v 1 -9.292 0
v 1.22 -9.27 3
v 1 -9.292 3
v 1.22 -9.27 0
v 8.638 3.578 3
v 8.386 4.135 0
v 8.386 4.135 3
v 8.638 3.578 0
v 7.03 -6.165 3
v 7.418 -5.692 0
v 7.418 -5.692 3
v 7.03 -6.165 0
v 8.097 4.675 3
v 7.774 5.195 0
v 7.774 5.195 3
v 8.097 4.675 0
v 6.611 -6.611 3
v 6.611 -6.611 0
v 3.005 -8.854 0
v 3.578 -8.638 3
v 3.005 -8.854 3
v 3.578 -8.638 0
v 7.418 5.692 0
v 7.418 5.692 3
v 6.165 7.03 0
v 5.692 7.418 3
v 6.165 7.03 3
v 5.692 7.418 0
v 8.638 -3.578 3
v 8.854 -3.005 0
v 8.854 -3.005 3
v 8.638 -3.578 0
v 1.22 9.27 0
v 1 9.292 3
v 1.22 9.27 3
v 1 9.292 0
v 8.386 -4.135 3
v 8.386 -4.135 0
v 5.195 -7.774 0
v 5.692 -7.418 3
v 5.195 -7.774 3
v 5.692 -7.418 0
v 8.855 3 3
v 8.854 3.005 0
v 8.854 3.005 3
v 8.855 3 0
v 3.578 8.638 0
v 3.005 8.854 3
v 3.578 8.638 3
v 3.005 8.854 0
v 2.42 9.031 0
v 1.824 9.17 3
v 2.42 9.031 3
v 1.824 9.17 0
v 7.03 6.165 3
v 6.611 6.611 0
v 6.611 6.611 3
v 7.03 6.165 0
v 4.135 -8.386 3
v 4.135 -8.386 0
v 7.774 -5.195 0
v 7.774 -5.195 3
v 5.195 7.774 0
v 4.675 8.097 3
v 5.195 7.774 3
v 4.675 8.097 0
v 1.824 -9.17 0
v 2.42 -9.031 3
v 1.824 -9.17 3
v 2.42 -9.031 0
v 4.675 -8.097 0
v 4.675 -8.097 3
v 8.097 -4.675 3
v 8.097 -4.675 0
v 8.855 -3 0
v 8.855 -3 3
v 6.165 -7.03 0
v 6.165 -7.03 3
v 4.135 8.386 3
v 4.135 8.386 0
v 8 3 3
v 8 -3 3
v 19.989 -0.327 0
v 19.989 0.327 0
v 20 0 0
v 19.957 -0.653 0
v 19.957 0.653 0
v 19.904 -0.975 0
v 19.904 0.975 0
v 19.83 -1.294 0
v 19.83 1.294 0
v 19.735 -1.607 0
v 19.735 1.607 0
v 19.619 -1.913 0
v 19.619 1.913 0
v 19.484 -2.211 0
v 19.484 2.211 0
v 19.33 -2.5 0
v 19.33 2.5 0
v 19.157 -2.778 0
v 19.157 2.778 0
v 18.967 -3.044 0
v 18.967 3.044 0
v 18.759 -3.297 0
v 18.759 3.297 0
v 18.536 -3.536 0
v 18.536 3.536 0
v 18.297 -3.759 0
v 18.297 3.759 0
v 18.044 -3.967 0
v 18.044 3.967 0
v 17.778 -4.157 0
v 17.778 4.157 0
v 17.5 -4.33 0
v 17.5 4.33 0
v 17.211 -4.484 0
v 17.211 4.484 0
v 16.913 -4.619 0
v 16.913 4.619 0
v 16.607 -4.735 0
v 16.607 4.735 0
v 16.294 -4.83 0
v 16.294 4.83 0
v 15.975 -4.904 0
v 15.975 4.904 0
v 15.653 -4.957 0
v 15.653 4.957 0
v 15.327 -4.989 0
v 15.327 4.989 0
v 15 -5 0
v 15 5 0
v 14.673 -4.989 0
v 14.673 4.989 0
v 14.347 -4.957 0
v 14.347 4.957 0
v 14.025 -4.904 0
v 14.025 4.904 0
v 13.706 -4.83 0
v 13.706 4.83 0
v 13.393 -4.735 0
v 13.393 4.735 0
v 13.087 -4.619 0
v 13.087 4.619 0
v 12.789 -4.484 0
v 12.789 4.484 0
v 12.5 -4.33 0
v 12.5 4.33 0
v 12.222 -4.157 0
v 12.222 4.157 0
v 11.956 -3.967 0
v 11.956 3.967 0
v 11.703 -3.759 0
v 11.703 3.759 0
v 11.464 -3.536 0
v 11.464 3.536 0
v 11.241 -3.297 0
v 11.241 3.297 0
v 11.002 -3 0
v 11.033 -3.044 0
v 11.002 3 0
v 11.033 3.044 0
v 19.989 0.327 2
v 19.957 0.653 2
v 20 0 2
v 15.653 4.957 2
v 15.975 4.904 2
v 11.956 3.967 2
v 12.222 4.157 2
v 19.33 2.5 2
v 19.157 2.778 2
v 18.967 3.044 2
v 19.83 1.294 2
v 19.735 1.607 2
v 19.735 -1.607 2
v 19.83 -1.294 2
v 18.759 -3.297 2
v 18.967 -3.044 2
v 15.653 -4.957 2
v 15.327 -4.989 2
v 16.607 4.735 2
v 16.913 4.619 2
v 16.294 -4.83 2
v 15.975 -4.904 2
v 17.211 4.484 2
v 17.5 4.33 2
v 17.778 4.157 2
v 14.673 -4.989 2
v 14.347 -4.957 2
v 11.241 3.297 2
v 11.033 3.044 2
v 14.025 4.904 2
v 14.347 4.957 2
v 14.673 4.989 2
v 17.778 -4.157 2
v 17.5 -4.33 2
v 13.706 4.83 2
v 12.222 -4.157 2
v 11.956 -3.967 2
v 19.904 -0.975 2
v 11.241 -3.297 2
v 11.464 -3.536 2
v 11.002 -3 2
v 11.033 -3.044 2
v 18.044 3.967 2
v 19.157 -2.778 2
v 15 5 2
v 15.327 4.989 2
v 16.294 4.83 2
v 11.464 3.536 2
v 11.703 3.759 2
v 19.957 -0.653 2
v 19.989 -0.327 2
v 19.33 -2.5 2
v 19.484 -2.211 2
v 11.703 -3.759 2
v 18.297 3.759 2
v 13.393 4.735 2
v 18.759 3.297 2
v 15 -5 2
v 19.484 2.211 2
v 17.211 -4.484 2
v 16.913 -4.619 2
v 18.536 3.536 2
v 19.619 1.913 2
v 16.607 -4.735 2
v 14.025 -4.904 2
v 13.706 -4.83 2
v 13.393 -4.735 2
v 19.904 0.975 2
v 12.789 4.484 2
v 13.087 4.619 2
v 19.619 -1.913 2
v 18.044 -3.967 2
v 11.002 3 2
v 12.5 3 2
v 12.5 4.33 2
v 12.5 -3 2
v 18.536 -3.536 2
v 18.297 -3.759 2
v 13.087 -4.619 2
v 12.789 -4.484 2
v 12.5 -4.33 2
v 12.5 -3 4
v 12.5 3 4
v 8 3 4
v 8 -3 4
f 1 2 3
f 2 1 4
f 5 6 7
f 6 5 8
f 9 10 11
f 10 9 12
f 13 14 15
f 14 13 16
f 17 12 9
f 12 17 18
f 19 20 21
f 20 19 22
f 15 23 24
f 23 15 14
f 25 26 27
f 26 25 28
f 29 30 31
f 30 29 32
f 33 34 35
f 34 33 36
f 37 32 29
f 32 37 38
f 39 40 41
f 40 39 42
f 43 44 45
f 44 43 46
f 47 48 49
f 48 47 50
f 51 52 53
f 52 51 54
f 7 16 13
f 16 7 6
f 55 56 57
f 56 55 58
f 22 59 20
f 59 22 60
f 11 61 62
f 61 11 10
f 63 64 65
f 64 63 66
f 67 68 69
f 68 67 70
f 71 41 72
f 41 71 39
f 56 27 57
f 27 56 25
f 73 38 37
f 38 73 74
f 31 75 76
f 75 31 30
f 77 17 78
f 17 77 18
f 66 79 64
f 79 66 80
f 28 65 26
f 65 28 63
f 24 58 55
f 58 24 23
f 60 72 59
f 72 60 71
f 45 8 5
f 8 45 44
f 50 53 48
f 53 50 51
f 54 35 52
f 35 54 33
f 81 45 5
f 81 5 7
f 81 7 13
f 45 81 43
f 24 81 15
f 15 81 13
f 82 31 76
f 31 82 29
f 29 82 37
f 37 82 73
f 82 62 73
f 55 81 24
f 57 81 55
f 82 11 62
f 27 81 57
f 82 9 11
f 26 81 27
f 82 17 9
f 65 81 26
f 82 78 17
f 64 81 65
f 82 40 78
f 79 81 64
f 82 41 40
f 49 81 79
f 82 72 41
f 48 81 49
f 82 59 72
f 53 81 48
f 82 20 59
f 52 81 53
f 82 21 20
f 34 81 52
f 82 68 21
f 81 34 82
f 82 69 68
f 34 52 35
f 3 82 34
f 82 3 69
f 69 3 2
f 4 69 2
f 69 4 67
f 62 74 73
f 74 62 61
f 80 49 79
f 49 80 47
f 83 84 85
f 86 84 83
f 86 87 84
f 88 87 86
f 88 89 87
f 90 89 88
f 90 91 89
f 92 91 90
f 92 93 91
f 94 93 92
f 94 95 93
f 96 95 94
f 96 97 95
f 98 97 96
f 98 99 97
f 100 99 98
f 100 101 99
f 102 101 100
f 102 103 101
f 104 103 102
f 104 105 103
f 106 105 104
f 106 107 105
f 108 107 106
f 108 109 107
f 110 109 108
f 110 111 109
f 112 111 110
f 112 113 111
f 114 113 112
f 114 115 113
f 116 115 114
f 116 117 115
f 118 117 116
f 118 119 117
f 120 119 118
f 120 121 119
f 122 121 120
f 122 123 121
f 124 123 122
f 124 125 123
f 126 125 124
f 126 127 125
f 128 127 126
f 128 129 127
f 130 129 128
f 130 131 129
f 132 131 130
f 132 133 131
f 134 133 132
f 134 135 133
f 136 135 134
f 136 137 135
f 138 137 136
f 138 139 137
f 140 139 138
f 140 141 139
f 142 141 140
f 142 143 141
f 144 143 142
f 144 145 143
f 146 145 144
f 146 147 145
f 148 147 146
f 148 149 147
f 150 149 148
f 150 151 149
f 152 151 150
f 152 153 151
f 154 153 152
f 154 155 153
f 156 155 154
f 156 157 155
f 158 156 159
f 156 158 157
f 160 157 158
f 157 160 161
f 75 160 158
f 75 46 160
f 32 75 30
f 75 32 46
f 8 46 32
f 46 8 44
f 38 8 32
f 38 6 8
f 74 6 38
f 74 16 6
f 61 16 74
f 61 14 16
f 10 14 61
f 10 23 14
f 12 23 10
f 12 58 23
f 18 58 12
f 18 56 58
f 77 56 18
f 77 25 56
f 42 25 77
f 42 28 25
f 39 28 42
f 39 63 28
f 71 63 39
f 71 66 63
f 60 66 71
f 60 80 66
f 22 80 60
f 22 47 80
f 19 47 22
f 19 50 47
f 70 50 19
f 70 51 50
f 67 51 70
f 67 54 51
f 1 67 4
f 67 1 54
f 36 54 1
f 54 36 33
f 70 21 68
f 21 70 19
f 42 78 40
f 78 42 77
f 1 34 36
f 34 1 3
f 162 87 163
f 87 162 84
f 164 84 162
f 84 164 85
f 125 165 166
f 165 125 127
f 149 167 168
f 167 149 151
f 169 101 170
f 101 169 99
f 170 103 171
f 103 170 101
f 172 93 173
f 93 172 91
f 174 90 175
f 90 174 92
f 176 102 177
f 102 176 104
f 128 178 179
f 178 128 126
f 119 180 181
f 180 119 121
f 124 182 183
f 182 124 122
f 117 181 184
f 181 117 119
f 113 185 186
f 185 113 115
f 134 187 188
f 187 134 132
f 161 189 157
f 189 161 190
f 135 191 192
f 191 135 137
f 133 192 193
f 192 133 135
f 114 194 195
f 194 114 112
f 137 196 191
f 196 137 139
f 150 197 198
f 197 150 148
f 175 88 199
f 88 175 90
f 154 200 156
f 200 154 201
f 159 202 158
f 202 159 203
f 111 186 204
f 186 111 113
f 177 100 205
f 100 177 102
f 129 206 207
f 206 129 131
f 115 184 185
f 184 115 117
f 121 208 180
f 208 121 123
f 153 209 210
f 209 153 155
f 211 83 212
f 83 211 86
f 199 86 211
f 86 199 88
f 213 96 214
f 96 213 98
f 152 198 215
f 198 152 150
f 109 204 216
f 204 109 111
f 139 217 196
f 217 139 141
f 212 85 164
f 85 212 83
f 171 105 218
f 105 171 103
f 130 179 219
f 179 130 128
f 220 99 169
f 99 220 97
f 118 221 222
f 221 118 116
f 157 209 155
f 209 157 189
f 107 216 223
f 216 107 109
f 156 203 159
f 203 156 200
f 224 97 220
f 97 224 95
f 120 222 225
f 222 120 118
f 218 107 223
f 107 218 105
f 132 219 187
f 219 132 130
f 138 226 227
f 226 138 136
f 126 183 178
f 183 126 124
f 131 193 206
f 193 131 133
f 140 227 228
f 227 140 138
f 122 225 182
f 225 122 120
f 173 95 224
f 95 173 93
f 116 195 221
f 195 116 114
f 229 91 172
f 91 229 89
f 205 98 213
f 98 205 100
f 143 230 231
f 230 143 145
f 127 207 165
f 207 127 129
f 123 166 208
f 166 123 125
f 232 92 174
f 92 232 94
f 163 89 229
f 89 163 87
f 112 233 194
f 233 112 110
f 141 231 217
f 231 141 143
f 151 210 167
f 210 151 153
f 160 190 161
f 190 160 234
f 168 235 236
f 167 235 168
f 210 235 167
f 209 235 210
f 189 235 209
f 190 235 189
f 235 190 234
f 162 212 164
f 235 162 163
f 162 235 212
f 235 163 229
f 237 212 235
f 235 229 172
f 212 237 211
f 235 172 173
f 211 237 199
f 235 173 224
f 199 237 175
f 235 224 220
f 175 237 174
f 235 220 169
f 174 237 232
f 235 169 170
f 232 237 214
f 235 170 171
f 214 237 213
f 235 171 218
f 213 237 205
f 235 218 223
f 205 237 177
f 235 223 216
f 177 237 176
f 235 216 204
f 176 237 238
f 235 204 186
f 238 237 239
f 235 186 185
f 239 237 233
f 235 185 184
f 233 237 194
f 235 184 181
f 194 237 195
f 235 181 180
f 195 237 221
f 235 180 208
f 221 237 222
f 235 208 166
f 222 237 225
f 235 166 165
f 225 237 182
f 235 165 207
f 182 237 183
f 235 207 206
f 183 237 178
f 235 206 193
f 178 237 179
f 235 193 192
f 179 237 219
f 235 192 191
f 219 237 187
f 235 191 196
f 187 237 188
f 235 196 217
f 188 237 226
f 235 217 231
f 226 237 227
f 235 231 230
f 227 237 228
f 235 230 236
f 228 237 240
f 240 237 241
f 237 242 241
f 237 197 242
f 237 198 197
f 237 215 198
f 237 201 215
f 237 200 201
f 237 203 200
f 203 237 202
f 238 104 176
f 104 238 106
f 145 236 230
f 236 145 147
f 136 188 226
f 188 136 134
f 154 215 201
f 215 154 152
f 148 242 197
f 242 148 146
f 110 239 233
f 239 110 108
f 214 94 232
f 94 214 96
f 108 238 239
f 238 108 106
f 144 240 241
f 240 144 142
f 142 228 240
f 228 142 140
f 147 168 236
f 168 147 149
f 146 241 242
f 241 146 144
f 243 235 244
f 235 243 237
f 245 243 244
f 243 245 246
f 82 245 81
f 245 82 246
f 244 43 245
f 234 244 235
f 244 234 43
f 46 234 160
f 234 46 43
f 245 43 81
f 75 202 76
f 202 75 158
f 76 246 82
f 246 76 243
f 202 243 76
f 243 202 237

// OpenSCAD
// Tubing clip for a 12.7 mm lab stand rod
// Print orientation: flat on the bed, extruded along +Z

$fn = 96;

// ---- Dimensions (mm) ----
ring_od      = 18.7;   // rod ring outer diameter
ring_id      = 12.7;   // rod ring inner diameter
ring_wall    = 3;      // rod ring wall thickness
rod_opening  = 10;     // width of the cut out of the -X side of the rod ring

tube_id      = 6;      // tubing ring inner diameter
tube_wall    = 2;      // tubing ring wall thickness
tube_od      = tube_id + 2 * tube_wall;  // tubing ring outer diameter (8 mm)
tube_x       = 15;     // centre of the tubing ring (X)
tube_opening = 4.5;    // width of the cut out of the +X side of the tubing ring

bridge_w     = 6;      // width of the solid bridge (Y)
bridge_x0    = 8;      // bridge start (X)
bridge_x1    = 12;     // bridge end (X)

eps          = 0.5;    // overcut so cutting shapes are not coplanar with faces

// ---- Model ----
union() {
    // Rod ring with a 10 mm wide opening on the -X side
    difference() {
        cylinder(h = ring_wall, d = ring_od);
        translate([0, 0, -eps])
            hull() {
                for (y = [-ring_od / 2, ring_od / 2])
                    translate([-ring_od / 2 - eps, y, 0])
                        cube([ring_od / 2 + eps + 1, 1, ring_wall + 2 * eps]);
            }
    }

    // Tubing ring with a 4.5 mm wide opening on the +X side
    difference() {
        translate([tube_x, 0, 0])
            cylinder(h = tube_wall, d = tube_od);
        translate([tube_x, 0, -eps])
            hull() {
                for (y = [-tube_opening / 2, tube_opening / 2])
                    translate([tube_x + tube_opening / 2 + eps, y, 0])
                        cube([tube_opening / 2 + eps + 1, 1, tube_wall + 2 * eps]);
            }
    }

    // Solid bridge between the two rings (X = 8 to X = 12)
    translate([bridge_x0, -bridge_w / 2, 0])
        cube([bridge_x1 - bridge_x0 + eps, bridge_w, ring_wall + 2 * eps]);
}
